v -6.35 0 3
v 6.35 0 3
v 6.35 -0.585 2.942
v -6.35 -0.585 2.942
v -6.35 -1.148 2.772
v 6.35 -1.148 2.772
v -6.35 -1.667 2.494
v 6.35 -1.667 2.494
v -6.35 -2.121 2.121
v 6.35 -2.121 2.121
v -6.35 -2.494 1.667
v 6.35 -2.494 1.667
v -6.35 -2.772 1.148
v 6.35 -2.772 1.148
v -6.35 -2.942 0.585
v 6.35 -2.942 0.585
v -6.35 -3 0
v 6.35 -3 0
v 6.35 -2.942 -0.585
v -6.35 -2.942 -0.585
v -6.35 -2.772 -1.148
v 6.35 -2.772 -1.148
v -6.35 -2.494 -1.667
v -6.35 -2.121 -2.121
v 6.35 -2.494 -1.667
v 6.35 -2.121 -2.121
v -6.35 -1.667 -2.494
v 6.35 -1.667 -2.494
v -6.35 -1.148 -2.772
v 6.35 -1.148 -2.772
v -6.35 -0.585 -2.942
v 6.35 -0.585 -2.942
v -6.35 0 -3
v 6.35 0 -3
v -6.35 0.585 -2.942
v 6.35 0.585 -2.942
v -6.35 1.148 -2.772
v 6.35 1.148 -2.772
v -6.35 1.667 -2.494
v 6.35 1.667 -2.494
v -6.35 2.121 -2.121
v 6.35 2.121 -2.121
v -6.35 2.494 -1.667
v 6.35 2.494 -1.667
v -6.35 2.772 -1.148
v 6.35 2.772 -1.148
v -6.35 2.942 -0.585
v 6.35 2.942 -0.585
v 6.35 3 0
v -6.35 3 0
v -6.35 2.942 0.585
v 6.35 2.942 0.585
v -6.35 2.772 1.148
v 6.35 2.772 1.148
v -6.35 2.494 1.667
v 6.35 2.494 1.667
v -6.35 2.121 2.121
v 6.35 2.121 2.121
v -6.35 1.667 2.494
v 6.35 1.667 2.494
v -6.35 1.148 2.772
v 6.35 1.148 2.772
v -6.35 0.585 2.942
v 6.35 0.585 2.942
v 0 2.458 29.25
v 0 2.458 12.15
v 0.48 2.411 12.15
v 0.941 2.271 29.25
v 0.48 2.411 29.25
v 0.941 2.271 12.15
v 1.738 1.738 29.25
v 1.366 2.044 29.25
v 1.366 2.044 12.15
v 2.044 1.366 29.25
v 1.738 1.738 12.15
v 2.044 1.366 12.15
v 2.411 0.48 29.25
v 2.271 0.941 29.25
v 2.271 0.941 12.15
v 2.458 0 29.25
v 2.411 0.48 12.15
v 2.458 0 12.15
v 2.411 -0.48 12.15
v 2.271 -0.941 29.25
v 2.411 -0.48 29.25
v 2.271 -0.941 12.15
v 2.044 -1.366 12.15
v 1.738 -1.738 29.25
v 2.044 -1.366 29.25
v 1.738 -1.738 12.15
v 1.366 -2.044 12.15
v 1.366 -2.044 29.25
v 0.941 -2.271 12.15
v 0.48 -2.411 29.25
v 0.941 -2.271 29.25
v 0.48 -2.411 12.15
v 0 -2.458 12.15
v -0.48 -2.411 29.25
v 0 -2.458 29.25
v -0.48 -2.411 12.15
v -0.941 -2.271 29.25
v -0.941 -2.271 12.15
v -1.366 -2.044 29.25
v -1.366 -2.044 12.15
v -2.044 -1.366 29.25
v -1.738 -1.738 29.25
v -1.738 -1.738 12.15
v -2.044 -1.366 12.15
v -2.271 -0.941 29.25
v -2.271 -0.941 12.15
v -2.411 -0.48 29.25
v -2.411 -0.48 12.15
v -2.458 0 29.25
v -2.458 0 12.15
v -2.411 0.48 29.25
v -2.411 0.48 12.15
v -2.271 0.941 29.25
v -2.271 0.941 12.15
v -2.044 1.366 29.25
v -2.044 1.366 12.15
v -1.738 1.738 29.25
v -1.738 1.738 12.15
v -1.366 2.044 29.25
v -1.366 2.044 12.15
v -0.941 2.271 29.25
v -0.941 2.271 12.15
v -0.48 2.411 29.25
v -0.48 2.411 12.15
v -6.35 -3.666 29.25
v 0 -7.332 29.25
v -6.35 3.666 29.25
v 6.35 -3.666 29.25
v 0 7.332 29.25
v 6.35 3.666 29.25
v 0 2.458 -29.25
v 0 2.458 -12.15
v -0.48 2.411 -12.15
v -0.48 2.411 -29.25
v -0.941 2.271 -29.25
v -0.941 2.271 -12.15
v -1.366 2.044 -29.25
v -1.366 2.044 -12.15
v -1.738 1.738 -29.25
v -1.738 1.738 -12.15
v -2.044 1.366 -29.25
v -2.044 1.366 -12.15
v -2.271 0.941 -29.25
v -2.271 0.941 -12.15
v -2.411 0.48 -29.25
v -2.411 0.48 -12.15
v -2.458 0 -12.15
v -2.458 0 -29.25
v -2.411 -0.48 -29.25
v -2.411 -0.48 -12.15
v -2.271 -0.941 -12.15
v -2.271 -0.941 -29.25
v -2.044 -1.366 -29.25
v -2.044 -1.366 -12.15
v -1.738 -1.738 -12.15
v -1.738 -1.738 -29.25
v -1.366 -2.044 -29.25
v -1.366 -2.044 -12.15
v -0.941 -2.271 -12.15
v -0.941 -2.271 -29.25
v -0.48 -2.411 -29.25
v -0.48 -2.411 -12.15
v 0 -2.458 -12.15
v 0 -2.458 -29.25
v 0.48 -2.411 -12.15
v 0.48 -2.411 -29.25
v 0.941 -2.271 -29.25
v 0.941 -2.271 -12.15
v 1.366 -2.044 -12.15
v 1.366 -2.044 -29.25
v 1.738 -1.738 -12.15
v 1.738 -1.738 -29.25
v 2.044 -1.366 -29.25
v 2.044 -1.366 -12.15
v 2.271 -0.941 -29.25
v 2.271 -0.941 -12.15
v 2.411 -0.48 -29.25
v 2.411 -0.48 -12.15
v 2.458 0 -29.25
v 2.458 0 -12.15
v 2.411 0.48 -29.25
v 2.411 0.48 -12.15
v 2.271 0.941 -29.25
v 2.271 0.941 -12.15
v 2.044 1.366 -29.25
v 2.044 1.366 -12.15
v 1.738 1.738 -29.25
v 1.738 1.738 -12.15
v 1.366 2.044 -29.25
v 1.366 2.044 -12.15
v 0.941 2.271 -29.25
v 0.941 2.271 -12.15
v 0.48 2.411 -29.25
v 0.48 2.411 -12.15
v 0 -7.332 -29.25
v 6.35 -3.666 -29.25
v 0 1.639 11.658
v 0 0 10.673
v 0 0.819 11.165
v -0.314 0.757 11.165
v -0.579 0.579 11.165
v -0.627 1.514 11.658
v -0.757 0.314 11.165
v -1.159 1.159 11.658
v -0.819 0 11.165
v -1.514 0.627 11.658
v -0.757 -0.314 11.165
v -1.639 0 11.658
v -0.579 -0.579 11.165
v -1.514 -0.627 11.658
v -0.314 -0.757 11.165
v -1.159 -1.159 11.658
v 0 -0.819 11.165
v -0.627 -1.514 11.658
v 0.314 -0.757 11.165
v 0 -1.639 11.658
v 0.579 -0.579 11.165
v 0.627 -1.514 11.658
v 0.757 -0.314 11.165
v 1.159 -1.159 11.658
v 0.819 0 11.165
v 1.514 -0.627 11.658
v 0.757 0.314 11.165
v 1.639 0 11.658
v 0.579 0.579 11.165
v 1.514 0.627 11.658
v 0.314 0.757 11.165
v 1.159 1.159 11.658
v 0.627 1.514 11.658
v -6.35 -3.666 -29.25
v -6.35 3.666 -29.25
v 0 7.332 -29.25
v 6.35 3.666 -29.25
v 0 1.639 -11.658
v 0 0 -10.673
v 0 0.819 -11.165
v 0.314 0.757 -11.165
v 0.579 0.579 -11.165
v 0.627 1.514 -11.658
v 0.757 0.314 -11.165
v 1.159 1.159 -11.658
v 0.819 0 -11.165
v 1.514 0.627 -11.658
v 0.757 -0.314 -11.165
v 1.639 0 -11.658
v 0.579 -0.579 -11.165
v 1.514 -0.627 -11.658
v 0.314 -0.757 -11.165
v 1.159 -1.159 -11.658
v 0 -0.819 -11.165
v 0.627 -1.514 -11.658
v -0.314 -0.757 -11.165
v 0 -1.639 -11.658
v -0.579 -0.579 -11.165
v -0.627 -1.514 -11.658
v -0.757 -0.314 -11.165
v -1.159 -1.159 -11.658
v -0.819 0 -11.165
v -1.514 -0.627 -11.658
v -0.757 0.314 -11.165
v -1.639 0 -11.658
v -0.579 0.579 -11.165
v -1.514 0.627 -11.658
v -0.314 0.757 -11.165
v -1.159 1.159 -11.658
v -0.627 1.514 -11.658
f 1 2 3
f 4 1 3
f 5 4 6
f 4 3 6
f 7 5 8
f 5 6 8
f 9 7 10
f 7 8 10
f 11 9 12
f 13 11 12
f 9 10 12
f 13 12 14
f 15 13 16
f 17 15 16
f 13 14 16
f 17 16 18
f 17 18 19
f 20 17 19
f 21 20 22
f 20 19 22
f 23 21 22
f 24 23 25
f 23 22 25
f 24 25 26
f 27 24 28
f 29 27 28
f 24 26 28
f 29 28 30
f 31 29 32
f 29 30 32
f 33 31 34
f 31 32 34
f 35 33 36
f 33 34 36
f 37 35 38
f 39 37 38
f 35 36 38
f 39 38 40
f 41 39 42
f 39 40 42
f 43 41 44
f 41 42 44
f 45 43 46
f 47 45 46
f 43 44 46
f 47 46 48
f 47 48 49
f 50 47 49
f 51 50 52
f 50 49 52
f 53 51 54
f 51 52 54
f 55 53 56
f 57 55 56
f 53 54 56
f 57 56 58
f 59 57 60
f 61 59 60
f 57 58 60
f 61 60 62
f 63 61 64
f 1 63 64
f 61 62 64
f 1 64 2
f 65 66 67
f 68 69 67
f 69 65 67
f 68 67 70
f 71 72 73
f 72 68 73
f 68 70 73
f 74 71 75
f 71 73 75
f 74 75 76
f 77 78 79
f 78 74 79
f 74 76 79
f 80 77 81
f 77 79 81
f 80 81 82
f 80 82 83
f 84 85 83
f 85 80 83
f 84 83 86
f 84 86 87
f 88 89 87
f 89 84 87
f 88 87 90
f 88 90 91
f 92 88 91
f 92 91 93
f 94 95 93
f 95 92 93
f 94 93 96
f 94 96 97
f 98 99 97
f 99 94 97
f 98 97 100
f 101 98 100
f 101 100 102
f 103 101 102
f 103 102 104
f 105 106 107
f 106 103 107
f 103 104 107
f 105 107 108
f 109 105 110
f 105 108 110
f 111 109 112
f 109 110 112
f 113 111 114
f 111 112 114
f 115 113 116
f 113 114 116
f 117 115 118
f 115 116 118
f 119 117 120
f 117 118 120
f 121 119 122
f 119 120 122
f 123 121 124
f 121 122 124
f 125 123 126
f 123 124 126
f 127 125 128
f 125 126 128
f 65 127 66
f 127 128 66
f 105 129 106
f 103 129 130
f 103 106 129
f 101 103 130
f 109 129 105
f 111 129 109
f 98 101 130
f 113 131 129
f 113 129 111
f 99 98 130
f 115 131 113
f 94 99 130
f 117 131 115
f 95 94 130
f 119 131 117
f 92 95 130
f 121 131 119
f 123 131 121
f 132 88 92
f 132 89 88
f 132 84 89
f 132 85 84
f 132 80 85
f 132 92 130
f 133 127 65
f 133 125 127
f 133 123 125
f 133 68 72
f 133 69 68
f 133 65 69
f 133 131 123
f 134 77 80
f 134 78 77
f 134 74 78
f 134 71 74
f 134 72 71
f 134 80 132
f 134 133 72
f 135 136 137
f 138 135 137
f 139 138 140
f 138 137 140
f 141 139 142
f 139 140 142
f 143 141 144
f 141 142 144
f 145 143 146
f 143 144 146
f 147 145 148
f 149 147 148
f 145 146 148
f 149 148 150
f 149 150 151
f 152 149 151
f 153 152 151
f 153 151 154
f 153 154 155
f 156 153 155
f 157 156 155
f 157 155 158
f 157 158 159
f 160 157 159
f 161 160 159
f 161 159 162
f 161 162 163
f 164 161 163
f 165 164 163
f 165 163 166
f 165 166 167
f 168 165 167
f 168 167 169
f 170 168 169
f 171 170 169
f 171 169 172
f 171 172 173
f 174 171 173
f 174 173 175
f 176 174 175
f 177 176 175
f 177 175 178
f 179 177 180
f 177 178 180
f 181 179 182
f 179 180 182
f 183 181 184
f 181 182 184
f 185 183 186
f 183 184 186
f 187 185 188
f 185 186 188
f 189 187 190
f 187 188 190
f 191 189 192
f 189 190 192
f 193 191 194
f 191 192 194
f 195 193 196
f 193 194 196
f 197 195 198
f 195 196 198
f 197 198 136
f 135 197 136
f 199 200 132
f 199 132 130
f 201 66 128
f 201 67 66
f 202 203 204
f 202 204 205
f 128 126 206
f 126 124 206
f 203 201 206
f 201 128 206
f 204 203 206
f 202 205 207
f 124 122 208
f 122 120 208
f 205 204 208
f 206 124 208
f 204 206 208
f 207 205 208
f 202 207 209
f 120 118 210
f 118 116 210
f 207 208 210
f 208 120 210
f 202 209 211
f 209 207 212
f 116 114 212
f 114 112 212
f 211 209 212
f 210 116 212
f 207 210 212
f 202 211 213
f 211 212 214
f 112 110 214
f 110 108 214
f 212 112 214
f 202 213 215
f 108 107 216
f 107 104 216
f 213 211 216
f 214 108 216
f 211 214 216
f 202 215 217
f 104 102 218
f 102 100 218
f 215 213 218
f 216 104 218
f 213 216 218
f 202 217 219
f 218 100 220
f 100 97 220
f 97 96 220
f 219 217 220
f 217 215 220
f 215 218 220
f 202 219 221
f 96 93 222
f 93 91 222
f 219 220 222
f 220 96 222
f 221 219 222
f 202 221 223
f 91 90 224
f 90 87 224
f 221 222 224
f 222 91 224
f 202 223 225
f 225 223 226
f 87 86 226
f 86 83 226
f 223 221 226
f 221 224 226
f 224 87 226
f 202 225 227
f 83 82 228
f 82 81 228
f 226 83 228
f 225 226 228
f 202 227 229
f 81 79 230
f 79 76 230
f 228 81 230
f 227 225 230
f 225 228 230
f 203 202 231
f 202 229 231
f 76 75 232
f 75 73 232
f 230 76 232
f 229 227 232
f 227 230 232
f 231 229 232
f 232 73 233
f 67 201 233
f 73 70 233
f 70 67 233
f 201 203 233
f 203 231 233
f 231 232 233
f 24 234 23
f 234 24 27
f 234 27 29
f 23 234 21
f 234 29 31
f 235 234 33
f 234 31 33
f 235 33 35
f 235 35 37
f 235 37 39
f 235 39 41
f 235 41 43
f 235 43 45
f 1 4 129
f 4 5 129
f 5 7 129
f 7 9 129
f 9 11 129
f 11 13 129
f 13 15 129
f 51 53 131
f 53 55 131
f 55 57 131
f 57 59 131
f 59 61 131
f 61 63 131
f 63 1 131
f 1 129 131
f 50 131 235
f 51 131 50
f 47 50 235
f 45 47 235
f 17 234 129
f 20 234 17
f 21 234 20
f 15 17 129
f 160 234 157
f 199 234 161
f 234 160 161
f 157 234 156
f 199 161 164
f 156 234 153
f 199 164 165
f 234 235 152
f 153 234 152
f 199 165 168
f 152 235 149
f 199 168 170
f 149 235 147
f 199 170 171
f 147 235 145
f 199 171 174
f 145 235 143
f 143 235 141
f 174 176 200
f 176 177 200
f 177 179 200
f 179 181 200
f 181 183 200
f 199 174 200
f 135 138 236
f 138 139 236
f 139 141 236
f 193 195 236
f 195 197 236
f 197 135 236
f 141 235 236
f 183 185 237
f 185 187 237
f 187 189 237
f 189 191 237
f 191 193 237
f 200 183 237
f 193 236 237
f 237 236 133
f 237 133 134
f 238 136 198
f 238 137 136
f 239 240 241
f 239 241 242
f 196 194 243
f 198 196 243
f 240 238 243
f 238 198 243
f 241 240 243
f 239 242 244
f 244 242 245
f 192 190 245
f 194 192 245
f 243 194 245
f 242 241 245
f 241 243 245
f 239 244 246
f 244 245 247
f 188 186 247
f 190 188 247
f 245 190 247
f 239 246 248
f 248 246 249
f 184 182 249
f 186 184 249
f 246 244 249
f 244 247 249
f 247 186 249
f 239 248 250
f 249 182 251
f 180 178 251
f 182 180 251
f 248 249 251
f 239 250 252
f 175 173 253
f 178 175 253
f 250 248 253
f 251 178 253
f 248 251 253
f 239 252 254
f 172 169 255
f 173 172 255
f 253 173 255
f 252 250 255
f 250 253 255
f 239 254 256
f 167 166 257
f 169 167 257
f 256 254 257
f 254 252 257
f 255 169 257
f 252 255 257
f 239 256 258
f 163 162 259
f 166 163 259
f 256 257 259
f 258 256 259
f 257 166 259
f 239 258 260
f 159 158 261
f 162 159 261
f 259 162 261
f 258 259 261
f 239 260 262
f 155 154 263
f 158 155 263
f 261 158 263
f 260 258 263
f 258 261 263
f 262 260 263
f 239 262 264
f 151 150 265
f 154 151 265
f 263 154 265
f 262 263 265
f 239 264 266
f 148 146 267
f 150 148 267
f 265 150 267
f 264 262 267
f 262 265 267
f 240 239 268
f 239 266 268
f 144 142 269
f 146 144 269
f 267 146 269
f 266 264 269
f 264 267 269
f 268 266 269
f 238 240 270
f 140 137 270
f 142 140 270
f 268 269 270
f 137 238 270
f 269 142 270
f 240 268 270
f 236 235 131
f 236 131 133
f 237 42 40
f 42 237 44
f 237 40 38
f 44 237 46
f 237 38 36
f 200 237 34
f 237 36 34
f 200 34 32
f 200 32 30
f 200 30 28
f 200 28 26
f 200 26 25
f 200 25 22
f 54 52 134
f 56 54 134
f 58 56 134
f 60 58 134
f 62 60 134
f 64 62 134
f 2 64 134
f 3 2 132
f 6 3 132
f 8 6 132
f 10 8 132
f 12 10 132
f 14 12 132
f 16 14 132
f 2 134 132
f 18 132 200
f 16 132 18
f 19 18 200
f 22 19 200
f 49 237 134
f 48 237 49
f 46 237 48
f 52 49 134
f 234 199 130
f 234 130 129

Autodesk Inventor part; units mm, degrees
ref_plane "YZ Plane" through (0, 0, 0) normal (1, 0, 0) x (0, 1, 0)
ref_plane "XZ Plane" through (0, 0, 0) normal (0, 1, 0) x (-1, 0, 0)
ref_plane "XY Plane" through (0, 0, 0) normal (0, 0, 1) x (1, 0, 0)
sketch "Sketch1" plane through (0, 0, 0) normal (0, 0, 1) x (1, 0, 0)
  line L0 (0, -7.3323) -> (-6.35, -3.6662)
  line L1 (-6.35, -3.6662) -> (-6.35, 3.6662)
  line L2 (-6.35, 3.6662) -> (0, 7.3323)
  line L3 (0, 7.3323) -> (6.35, 3.6662)
  line L4 (6.35, 3.6662) -> (6.35, -3.6662)
  line L5 (6.35, -3.6662) -> (0, -7.3323)
  circle A0 centre (0, 0) radius 3
  dimension "d0" = 12.7
  dimension "d1" = 6
extrude "Extrusion2" add sketch "Sketch1" along normal mid plane 58.5 contours L0 L1 L2 L3 L4 L5 | A0
sketch "Sketch4" plane through (-6.35, -3.6662, -29.25) normal (-1, 0, 0) x (0, 0, 1)
  line L0 (58.5, 7.3323) -> (58.5, 0) projected
  line L1 (0, 0) -> (0, 7.3323) projected
  point P0 (29.25, 3.6662)
  point P1 (29.25, 3.6662)
  point P2 (58.5, 3.6662)
  dimension "d43" = 58.5
hole "Hole4" at (-6.35, 0, 0) direction (1, 0, 0) diameter 6 end through all
sketch "Sketch5" plane through (0, 0, -29.25) normal (0, 0, -1) x (-1, 0, 0)
  point P0 (0, 0)
  point P1 (0, 0)
hole "Hole5" at (0, 0, -29.25) direction (0, 0, 1) diameter 4.917 depth 17.1 tip angle 118 thread size "M6x1" class "6H" standard "ISO Metric profile"
mirror "Mirror1" about plane through (0, 0, 0) normal (0, 0, 1) of "Hole5"
properties part number "pistony"
